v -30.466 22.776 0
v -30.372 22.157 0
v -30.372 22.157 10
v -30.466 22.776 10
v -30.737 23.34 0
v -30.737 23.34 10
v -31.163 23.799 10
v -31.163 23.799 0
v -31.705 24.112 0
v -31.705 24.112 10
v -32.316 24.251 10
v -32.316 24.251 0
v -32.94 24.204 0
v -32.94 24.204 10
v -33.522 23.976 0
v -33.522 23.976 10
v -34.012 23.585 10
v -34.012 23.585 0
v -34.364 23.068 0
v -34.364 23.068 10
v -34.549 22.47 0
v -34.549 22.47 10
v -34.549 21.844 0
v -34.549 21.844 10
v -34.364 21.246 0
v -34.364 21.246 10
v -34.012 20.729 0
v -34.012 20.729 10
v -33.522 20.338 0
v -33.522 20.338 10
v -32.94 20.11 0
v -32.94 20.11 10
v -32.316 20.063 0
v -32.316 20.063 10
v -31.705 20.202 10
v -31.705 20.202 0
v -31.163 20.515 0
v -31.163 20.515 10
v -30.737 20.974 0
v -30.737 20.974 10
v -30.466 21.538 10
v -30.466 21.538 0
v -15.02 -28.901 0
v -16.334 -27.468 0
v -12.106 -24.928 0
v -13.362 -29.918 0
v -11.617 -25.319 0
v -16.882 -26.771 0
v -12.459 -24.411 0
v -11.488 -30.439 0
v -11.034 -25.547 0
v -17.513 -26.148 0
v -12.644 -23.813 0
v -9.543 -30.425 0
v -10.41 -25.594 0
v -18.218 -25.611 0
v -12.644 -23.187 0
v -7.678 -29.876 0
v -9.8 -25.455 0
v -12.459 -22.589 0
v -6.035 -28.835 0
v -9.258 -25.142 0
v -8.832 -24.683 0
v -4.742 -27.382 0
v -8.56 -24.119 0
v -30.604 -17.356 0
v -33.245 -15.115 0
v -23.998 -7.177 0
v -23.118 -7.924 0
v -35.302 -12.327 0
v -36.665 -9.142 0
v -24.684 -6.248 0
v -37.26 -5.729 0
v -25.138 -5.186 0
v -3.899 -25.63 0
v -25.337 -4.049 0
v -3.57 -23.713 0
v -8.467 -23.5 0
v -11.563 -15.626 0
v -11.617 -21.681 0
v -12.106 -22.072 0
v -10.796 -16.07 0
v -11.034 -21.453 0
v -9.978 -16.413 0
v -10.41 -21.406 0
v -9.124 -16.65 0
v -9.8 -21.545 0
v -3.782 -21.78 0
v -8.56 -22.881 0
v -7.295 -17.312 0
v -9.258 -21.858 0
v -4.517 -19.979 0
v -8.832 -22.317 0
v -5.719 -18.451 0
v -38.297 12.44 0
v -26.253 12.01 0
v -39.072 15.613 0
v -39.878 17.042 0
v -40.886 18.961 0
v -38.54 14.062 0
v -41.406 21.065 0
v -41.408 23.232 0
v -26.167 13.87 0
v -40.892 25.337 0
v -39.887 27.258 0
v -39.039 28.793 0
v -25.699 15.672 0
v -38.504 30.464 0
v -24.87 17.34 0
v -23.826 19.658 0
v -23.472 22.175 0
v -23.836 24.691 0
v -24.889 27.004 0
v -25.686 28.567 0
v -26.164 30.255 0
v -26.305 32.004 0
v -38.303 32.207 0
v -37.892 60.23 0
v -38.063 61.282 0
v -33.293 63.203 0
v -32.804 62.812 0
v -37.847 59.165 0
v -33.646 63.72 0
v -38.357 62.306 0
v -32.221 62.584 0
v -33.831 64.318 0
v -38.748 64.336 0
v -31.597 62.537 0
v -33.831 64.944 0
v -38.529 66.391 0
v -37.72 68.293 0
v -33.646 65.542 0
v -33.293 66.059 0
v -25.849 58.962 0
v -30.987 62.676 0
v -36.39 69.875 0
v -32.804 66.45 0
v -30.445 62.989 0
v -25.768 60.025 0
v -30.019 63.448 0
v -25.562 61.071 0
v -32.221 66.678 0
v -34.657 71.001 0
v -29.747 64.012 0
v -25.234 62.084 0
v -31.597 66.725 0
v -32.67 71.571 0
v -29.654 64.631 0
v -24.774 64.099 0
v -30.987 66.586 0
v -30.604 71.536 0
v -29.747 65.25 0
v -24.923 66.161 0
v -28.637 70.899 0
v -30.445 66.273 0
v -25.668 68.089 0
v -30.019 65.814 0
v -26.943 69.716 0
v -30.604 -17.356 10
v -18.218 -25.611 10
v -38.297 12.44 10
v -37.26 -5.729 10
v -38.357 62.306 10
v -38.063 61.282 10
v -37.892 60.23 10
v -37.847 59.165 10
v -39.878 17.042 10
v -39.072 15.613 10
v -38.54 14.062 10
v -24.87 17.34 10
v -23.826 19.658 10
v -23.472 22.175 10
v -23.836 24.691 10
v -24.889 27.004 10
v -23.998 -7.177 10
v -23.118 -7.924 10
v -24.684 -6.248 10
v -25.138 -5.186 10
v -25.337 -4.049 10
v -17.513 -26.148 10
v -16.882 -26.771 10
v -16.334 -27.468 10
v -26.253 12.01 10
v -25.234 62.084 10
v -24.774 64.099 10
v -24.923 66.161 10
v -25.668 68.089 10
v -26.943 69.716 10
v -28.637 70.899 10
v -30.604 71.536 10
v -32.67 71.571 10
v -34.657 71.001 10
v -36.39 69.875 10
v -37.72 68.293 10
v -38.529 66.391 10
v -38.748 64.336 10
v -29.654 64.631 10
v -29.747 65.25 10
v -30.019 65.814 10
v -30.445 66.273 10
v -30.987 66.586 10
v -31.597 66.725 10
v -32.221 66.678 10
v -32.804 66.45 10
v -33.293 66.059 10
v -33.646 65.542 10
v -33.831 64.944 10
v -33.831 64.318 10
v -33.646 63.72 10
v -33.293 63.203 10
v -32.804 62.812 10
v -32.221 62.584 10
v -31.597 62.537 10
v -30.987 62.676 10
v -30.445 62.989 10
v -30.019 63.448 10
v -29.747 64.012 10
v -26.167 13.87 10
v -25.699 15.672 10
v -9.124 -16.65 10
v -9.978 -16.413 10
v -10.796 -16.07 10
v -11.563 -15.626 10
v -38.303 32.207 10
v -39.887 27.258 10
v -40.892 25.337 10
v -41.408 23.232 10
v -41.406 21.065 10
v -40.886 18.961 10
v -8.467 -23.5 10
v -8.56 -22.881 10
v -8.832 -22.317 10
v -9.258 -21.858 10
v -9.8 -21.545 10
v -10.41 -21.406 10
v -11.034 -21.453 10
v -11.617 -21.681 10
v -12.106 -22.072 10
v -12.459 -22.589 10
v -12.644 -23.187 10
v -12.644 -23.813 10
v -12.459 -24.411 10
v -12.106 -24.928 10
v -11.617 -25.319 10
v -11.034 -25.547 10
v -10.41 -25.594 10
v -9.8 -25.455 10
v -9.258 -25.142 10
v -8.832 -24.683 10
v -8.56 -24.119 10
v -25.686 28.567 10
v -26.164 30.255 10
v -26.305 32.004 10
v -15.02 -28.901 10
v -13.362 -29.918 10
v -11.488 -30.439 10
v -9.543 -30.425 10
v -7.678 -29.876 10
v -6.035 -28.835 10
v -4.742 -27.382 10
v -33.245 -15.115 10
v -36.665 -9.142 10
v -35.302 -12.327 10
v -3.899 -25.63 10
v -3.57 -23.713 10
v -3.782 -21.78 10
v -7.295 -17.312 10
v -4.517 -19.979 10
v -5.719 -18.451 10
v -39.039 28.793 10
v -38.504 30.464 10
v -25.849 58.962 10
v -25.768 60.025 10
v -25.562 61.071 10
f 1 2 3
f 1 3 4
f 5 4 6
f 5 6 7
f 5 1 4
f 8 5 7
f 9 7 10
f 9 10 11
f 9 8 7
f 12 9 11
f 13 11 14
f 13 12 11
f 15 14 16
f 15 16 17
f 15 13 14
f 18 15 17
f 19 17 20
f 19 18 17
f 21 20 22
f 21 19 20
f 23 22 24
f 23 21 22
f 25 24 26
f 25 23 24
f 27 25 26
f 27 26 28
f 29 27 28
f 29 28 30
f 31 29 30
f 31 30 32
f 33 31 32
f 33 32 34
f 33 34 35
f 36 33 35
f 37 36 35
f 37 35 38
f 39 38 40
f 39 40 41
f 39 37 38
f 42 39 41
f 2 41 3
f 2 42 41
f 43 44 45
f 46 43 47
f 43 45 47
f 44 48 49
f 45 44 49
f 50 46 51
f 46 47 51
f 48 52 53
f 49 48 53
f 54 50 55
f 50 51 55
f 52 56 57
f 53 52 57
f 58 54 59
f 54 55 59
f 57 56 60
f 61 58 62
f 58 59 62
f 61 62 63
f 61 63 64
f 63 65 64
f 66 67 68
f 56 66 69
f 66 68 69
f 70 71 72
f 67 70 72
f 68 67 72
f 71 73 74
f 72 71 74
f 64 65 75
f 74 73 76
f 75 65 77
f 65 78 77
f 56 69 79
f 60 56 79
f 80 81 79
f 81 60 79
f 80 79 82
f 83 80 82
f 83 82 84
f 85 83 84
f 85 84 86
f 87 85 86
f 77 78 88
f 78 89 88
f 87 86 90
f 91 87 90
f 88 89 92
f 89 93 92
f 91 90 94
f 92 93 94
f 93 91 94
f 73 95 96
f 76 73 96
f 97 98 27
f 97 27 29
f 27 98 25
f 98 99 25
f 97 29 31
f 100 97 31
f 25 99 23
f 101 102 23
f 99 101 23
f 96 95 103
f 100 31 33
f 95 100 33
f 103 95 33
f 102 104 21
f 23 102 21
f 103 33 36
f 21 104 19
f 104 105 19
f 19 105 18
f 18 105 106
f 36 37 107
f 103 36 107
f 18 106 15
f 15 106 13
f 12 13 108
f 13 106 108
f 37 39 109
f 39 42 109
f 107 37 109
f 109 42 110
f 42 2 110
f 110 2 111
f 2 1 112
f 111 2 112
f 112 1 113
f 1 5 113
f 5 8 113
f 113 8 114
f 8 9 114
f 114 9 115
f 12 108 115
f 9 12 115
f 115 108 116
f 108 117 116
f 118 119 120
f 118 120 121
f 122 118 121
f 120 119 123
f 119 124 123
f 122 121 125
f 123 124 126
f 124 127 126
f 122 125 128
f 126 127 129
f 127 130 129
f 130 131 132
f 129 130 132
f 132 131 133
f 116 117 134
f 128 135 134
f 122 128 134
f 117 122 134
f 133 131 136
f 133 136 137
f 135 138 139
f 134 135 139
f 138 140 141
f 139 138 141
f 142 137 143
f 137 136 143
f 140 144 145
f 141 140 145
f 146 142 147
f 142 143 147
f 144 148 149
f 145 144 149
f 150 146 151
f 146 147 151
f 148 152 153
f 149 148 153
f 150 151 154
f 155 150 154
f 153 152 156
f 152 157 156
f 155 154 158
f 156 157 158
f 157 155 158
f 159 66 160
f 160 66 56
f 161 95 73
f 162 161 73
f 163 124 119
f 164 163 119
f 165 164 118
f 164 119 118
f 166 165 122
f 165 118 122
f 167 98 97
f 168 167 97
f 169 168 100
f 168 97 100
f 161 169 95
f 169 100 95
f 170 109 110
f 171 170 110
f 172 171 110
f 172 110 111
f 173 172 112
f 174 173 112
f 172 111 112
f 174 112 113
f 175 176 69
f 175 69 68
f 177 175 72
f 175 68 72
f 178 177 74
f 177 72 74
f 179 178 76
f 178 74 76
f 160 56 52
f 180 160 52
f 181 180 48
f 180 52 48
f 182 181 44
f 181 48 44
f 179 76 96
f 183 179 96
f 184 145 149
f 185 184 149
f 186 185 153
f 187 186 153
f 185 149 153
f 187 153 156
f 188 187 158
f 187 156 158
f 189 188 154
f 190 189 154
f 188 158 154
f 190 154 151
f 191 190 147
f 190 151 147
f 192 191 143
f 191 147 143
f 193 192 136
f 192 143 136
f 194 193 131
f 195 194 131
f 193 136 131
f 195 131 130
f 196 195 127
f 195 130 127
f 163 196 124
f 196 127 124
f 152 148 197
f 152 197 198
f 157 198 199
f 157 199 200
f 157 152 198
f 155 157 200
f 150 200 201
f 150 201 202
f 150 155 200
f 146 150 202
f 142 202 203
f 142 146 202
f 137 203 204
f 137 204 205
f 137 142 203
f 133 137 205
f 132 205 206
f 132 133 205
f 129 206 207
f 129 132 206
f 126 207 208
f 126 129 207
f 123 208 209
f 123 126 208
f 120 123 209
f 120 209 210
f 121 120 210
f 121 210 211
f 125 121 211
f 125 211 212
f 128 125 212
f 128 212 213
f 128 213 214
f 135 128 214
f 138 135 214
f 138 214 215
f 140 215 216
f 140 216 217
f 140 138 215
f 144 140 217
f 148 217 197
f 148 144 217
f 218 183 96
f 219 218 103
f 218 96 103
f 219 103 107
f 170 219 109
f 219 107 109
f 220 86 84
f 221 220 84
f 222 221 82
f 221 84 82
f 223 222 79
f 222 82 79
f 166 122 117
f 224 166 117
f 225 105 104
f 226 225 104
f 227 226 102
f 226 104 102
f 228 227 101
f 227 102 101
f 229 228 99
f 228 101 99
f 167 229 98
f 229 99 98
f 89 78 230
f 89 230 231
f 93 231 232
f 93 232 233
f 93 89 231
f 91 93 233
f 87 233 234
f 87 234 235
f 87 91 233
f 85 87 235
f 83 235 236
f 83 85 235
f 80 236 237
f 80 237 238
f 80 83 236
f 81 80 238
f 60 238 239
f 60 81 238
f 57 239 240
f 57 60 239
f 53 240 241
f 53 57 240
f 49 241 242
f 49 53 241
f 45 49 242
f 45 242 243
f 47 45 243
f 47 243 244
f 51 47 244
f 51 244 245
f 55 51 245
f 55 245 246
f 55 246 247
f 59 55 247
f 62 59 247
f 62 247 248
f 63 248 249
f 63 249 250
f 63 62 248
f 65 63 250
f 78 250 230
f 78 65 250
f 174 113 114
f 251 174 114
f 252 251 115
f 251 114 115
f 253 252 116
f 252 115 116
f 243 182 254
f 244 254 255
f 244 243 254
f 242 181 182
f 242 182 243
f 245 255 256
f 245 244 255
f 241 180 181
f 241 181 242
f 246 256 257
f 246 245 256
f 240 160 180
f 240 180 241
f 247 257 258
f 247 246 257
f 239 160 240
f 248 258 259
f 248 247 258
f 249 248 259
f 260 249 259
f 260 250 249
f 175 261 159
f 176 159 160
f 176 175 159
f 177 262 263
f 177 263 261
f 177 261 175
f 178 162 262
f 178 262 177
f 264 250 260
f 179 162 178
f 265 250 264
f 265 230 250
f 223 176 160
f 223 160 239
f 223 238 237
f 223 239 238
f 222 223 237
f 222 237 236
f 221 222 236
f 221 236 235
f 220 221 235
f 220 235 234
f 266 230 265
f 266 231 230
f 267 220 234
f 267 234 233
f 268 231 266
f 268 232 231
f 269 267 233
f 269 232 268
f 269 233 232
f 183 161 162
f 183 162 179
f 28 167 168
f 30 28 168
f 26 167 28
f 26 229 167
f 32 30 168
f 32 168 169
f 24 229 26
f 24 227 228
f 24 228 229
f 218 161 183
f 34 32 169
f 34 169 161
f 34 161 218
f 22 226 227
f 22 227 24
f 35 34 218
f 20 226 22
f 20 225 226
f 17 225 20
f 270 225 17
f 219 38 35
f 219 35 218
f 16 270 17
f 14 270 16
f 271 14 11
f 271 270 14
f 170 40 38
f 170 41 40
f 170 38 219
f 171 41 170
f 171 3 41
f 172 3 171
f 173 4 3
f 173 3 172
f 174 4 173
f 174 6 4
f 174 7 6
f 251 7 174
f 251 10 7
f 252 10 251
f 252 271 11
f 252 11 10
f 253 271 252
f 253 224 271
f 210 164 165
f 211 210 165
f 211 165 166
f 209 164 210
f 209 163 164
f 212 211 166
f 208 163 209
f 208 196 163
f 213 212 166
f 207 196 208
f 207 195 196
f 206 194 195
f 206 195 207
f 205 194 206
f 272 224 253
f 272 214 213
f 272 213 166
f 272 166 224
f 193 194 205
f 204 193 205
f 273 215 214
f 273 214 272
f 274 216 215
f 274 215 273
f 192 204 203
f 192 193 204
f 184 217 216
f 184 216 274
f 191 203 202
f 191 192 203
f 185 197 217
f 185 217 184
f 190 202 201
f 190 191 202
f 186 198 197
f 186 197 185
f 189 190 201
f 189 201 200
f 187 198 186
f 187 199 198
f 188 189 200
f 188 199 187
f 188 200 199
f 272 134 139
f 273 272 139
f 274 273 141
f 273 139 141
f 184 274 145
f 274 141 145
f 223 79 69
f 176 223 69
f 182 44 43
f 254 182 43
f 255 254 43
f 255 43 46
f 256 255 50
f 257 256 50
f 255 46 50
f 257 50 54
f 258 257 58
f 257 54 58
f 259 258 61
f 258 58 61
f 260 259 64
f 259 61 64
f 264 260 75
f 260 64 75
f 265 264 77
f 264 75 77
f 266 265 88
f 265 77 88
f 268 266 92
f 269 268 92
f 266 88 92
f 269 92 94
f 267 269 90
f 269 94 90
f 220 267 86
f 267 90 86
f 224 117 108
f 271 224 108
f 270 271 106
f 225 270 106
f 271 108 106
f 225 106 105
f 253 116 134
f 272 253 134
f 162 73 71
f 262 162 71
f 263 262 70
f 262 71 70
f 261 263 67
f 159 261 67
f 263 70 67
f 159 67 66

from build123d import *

# Parameters (mm, degrees)
CROQUIS1_R              = 2.1
SALIENTE_EXTRUIR1_DEPTH = 10


with BuildPart() as part:
    # Croquis1 → Saliente-Extruir1 (new body)
    with BuildSketch(Plane.XY):
        with BuildLine():
            Line((-38.297463257, 12.43995528), (-37.260227552, -5.729430968))
            ThreePointArc((-37.260227552, -5.729430968), (-35.302123155, -12.327326048), (-30.603607028, -17.356276091))
            Line((-30.603607028, -17.356276091), (-18.21840671, -25.610918133))
            ThreePointArc((-18.21840671, -25.610918133), (-17.187574321, -26.449545076), (-16.333802614, -27.467869404))
            ThreePointArc((-16.333802614, -27.467869404), (-4.742179488, -27.382198605), (-9.124005181, -16.65034556))
            ThreePointArc((-9.124005181, -16.65034556), (-10.39246616, -16.254217865), (-11.563209017, -15.625511598))
            Line((-11.563209017, -15.625511598), (-23.117754007, -7.92449503))
            ThreePointArc((-23.117754007, -7.92449503), (-24.683926049, -6.248178349), (-25.336627514, -4.048879989))
            Line((-25.336627514, -4.048879989), (-26.253353052, 12.009514726))
            ThreePointArc((-26.253353052, 12.009514726), (-25.979466195, 14.783004808), (-24.870216746, 17.339726714))
            ThreePointArc((-24.870216746, 17.339726714), (-23.472468719, 22.17483806), (-24.889381967, 27.004367864))
            ThreePointArc((-24.889381967, 27.004367864), (-25.965866103, 29.399778244), (-26.305025758, 32.003963281))
            Line((-26.305025758, 32.003963281), (-25.84900792, 58.962467928))
            ThreePointArc((-25.84900792, 58.962467928), (-25.680378416, 60.550833412), (-25.233618645, 62.084373932))
            ThreePointArc((-25.233618645, 62.084373932), (-31.635589461, 71.629913394), (-38.356741428, 62.306358804))
            ThreePointArc((-38.356741428, 62.306358804), (-37.962103741, 60.758585549), (-37.847291474, 59.165425451))
            Line((-37.847291474, 59.165425451), (-38.303309312, 32.206920805))
            ThreePointArc((-38.303309312, 32.206920805), (-38.73035213, 29.615696581), (-39.887236501, 27.25806491))
            ThreePointArc((-39.887236501, 27.25806491), (-41.472447055, 22.148538835), (-39.877642432, 17.041999163))
            ThreePointArc((-39.877642432, 17.041999163), (-38.770646544, 14.849791642), (-38.297463257, 12.43995528))
        make_face()
        with Locations((-10.567, -23.5)):
            Circle(CROQUIS1_R, mode=Mode.SUBTRACT)
        with Locations((-32.472451023, 22.156990874)):
            Circle(CROQUIS1_R, mode=Mode.SUBTRACT)
        with Locations((-31.753981392, 64.630914655)):
            Circle(CROQUIS1_R, mode=Mode.SUBTRACT)
    extrude(amount=SALIENTE_EXTRUIR1_DEPTH)


solid = part.part
